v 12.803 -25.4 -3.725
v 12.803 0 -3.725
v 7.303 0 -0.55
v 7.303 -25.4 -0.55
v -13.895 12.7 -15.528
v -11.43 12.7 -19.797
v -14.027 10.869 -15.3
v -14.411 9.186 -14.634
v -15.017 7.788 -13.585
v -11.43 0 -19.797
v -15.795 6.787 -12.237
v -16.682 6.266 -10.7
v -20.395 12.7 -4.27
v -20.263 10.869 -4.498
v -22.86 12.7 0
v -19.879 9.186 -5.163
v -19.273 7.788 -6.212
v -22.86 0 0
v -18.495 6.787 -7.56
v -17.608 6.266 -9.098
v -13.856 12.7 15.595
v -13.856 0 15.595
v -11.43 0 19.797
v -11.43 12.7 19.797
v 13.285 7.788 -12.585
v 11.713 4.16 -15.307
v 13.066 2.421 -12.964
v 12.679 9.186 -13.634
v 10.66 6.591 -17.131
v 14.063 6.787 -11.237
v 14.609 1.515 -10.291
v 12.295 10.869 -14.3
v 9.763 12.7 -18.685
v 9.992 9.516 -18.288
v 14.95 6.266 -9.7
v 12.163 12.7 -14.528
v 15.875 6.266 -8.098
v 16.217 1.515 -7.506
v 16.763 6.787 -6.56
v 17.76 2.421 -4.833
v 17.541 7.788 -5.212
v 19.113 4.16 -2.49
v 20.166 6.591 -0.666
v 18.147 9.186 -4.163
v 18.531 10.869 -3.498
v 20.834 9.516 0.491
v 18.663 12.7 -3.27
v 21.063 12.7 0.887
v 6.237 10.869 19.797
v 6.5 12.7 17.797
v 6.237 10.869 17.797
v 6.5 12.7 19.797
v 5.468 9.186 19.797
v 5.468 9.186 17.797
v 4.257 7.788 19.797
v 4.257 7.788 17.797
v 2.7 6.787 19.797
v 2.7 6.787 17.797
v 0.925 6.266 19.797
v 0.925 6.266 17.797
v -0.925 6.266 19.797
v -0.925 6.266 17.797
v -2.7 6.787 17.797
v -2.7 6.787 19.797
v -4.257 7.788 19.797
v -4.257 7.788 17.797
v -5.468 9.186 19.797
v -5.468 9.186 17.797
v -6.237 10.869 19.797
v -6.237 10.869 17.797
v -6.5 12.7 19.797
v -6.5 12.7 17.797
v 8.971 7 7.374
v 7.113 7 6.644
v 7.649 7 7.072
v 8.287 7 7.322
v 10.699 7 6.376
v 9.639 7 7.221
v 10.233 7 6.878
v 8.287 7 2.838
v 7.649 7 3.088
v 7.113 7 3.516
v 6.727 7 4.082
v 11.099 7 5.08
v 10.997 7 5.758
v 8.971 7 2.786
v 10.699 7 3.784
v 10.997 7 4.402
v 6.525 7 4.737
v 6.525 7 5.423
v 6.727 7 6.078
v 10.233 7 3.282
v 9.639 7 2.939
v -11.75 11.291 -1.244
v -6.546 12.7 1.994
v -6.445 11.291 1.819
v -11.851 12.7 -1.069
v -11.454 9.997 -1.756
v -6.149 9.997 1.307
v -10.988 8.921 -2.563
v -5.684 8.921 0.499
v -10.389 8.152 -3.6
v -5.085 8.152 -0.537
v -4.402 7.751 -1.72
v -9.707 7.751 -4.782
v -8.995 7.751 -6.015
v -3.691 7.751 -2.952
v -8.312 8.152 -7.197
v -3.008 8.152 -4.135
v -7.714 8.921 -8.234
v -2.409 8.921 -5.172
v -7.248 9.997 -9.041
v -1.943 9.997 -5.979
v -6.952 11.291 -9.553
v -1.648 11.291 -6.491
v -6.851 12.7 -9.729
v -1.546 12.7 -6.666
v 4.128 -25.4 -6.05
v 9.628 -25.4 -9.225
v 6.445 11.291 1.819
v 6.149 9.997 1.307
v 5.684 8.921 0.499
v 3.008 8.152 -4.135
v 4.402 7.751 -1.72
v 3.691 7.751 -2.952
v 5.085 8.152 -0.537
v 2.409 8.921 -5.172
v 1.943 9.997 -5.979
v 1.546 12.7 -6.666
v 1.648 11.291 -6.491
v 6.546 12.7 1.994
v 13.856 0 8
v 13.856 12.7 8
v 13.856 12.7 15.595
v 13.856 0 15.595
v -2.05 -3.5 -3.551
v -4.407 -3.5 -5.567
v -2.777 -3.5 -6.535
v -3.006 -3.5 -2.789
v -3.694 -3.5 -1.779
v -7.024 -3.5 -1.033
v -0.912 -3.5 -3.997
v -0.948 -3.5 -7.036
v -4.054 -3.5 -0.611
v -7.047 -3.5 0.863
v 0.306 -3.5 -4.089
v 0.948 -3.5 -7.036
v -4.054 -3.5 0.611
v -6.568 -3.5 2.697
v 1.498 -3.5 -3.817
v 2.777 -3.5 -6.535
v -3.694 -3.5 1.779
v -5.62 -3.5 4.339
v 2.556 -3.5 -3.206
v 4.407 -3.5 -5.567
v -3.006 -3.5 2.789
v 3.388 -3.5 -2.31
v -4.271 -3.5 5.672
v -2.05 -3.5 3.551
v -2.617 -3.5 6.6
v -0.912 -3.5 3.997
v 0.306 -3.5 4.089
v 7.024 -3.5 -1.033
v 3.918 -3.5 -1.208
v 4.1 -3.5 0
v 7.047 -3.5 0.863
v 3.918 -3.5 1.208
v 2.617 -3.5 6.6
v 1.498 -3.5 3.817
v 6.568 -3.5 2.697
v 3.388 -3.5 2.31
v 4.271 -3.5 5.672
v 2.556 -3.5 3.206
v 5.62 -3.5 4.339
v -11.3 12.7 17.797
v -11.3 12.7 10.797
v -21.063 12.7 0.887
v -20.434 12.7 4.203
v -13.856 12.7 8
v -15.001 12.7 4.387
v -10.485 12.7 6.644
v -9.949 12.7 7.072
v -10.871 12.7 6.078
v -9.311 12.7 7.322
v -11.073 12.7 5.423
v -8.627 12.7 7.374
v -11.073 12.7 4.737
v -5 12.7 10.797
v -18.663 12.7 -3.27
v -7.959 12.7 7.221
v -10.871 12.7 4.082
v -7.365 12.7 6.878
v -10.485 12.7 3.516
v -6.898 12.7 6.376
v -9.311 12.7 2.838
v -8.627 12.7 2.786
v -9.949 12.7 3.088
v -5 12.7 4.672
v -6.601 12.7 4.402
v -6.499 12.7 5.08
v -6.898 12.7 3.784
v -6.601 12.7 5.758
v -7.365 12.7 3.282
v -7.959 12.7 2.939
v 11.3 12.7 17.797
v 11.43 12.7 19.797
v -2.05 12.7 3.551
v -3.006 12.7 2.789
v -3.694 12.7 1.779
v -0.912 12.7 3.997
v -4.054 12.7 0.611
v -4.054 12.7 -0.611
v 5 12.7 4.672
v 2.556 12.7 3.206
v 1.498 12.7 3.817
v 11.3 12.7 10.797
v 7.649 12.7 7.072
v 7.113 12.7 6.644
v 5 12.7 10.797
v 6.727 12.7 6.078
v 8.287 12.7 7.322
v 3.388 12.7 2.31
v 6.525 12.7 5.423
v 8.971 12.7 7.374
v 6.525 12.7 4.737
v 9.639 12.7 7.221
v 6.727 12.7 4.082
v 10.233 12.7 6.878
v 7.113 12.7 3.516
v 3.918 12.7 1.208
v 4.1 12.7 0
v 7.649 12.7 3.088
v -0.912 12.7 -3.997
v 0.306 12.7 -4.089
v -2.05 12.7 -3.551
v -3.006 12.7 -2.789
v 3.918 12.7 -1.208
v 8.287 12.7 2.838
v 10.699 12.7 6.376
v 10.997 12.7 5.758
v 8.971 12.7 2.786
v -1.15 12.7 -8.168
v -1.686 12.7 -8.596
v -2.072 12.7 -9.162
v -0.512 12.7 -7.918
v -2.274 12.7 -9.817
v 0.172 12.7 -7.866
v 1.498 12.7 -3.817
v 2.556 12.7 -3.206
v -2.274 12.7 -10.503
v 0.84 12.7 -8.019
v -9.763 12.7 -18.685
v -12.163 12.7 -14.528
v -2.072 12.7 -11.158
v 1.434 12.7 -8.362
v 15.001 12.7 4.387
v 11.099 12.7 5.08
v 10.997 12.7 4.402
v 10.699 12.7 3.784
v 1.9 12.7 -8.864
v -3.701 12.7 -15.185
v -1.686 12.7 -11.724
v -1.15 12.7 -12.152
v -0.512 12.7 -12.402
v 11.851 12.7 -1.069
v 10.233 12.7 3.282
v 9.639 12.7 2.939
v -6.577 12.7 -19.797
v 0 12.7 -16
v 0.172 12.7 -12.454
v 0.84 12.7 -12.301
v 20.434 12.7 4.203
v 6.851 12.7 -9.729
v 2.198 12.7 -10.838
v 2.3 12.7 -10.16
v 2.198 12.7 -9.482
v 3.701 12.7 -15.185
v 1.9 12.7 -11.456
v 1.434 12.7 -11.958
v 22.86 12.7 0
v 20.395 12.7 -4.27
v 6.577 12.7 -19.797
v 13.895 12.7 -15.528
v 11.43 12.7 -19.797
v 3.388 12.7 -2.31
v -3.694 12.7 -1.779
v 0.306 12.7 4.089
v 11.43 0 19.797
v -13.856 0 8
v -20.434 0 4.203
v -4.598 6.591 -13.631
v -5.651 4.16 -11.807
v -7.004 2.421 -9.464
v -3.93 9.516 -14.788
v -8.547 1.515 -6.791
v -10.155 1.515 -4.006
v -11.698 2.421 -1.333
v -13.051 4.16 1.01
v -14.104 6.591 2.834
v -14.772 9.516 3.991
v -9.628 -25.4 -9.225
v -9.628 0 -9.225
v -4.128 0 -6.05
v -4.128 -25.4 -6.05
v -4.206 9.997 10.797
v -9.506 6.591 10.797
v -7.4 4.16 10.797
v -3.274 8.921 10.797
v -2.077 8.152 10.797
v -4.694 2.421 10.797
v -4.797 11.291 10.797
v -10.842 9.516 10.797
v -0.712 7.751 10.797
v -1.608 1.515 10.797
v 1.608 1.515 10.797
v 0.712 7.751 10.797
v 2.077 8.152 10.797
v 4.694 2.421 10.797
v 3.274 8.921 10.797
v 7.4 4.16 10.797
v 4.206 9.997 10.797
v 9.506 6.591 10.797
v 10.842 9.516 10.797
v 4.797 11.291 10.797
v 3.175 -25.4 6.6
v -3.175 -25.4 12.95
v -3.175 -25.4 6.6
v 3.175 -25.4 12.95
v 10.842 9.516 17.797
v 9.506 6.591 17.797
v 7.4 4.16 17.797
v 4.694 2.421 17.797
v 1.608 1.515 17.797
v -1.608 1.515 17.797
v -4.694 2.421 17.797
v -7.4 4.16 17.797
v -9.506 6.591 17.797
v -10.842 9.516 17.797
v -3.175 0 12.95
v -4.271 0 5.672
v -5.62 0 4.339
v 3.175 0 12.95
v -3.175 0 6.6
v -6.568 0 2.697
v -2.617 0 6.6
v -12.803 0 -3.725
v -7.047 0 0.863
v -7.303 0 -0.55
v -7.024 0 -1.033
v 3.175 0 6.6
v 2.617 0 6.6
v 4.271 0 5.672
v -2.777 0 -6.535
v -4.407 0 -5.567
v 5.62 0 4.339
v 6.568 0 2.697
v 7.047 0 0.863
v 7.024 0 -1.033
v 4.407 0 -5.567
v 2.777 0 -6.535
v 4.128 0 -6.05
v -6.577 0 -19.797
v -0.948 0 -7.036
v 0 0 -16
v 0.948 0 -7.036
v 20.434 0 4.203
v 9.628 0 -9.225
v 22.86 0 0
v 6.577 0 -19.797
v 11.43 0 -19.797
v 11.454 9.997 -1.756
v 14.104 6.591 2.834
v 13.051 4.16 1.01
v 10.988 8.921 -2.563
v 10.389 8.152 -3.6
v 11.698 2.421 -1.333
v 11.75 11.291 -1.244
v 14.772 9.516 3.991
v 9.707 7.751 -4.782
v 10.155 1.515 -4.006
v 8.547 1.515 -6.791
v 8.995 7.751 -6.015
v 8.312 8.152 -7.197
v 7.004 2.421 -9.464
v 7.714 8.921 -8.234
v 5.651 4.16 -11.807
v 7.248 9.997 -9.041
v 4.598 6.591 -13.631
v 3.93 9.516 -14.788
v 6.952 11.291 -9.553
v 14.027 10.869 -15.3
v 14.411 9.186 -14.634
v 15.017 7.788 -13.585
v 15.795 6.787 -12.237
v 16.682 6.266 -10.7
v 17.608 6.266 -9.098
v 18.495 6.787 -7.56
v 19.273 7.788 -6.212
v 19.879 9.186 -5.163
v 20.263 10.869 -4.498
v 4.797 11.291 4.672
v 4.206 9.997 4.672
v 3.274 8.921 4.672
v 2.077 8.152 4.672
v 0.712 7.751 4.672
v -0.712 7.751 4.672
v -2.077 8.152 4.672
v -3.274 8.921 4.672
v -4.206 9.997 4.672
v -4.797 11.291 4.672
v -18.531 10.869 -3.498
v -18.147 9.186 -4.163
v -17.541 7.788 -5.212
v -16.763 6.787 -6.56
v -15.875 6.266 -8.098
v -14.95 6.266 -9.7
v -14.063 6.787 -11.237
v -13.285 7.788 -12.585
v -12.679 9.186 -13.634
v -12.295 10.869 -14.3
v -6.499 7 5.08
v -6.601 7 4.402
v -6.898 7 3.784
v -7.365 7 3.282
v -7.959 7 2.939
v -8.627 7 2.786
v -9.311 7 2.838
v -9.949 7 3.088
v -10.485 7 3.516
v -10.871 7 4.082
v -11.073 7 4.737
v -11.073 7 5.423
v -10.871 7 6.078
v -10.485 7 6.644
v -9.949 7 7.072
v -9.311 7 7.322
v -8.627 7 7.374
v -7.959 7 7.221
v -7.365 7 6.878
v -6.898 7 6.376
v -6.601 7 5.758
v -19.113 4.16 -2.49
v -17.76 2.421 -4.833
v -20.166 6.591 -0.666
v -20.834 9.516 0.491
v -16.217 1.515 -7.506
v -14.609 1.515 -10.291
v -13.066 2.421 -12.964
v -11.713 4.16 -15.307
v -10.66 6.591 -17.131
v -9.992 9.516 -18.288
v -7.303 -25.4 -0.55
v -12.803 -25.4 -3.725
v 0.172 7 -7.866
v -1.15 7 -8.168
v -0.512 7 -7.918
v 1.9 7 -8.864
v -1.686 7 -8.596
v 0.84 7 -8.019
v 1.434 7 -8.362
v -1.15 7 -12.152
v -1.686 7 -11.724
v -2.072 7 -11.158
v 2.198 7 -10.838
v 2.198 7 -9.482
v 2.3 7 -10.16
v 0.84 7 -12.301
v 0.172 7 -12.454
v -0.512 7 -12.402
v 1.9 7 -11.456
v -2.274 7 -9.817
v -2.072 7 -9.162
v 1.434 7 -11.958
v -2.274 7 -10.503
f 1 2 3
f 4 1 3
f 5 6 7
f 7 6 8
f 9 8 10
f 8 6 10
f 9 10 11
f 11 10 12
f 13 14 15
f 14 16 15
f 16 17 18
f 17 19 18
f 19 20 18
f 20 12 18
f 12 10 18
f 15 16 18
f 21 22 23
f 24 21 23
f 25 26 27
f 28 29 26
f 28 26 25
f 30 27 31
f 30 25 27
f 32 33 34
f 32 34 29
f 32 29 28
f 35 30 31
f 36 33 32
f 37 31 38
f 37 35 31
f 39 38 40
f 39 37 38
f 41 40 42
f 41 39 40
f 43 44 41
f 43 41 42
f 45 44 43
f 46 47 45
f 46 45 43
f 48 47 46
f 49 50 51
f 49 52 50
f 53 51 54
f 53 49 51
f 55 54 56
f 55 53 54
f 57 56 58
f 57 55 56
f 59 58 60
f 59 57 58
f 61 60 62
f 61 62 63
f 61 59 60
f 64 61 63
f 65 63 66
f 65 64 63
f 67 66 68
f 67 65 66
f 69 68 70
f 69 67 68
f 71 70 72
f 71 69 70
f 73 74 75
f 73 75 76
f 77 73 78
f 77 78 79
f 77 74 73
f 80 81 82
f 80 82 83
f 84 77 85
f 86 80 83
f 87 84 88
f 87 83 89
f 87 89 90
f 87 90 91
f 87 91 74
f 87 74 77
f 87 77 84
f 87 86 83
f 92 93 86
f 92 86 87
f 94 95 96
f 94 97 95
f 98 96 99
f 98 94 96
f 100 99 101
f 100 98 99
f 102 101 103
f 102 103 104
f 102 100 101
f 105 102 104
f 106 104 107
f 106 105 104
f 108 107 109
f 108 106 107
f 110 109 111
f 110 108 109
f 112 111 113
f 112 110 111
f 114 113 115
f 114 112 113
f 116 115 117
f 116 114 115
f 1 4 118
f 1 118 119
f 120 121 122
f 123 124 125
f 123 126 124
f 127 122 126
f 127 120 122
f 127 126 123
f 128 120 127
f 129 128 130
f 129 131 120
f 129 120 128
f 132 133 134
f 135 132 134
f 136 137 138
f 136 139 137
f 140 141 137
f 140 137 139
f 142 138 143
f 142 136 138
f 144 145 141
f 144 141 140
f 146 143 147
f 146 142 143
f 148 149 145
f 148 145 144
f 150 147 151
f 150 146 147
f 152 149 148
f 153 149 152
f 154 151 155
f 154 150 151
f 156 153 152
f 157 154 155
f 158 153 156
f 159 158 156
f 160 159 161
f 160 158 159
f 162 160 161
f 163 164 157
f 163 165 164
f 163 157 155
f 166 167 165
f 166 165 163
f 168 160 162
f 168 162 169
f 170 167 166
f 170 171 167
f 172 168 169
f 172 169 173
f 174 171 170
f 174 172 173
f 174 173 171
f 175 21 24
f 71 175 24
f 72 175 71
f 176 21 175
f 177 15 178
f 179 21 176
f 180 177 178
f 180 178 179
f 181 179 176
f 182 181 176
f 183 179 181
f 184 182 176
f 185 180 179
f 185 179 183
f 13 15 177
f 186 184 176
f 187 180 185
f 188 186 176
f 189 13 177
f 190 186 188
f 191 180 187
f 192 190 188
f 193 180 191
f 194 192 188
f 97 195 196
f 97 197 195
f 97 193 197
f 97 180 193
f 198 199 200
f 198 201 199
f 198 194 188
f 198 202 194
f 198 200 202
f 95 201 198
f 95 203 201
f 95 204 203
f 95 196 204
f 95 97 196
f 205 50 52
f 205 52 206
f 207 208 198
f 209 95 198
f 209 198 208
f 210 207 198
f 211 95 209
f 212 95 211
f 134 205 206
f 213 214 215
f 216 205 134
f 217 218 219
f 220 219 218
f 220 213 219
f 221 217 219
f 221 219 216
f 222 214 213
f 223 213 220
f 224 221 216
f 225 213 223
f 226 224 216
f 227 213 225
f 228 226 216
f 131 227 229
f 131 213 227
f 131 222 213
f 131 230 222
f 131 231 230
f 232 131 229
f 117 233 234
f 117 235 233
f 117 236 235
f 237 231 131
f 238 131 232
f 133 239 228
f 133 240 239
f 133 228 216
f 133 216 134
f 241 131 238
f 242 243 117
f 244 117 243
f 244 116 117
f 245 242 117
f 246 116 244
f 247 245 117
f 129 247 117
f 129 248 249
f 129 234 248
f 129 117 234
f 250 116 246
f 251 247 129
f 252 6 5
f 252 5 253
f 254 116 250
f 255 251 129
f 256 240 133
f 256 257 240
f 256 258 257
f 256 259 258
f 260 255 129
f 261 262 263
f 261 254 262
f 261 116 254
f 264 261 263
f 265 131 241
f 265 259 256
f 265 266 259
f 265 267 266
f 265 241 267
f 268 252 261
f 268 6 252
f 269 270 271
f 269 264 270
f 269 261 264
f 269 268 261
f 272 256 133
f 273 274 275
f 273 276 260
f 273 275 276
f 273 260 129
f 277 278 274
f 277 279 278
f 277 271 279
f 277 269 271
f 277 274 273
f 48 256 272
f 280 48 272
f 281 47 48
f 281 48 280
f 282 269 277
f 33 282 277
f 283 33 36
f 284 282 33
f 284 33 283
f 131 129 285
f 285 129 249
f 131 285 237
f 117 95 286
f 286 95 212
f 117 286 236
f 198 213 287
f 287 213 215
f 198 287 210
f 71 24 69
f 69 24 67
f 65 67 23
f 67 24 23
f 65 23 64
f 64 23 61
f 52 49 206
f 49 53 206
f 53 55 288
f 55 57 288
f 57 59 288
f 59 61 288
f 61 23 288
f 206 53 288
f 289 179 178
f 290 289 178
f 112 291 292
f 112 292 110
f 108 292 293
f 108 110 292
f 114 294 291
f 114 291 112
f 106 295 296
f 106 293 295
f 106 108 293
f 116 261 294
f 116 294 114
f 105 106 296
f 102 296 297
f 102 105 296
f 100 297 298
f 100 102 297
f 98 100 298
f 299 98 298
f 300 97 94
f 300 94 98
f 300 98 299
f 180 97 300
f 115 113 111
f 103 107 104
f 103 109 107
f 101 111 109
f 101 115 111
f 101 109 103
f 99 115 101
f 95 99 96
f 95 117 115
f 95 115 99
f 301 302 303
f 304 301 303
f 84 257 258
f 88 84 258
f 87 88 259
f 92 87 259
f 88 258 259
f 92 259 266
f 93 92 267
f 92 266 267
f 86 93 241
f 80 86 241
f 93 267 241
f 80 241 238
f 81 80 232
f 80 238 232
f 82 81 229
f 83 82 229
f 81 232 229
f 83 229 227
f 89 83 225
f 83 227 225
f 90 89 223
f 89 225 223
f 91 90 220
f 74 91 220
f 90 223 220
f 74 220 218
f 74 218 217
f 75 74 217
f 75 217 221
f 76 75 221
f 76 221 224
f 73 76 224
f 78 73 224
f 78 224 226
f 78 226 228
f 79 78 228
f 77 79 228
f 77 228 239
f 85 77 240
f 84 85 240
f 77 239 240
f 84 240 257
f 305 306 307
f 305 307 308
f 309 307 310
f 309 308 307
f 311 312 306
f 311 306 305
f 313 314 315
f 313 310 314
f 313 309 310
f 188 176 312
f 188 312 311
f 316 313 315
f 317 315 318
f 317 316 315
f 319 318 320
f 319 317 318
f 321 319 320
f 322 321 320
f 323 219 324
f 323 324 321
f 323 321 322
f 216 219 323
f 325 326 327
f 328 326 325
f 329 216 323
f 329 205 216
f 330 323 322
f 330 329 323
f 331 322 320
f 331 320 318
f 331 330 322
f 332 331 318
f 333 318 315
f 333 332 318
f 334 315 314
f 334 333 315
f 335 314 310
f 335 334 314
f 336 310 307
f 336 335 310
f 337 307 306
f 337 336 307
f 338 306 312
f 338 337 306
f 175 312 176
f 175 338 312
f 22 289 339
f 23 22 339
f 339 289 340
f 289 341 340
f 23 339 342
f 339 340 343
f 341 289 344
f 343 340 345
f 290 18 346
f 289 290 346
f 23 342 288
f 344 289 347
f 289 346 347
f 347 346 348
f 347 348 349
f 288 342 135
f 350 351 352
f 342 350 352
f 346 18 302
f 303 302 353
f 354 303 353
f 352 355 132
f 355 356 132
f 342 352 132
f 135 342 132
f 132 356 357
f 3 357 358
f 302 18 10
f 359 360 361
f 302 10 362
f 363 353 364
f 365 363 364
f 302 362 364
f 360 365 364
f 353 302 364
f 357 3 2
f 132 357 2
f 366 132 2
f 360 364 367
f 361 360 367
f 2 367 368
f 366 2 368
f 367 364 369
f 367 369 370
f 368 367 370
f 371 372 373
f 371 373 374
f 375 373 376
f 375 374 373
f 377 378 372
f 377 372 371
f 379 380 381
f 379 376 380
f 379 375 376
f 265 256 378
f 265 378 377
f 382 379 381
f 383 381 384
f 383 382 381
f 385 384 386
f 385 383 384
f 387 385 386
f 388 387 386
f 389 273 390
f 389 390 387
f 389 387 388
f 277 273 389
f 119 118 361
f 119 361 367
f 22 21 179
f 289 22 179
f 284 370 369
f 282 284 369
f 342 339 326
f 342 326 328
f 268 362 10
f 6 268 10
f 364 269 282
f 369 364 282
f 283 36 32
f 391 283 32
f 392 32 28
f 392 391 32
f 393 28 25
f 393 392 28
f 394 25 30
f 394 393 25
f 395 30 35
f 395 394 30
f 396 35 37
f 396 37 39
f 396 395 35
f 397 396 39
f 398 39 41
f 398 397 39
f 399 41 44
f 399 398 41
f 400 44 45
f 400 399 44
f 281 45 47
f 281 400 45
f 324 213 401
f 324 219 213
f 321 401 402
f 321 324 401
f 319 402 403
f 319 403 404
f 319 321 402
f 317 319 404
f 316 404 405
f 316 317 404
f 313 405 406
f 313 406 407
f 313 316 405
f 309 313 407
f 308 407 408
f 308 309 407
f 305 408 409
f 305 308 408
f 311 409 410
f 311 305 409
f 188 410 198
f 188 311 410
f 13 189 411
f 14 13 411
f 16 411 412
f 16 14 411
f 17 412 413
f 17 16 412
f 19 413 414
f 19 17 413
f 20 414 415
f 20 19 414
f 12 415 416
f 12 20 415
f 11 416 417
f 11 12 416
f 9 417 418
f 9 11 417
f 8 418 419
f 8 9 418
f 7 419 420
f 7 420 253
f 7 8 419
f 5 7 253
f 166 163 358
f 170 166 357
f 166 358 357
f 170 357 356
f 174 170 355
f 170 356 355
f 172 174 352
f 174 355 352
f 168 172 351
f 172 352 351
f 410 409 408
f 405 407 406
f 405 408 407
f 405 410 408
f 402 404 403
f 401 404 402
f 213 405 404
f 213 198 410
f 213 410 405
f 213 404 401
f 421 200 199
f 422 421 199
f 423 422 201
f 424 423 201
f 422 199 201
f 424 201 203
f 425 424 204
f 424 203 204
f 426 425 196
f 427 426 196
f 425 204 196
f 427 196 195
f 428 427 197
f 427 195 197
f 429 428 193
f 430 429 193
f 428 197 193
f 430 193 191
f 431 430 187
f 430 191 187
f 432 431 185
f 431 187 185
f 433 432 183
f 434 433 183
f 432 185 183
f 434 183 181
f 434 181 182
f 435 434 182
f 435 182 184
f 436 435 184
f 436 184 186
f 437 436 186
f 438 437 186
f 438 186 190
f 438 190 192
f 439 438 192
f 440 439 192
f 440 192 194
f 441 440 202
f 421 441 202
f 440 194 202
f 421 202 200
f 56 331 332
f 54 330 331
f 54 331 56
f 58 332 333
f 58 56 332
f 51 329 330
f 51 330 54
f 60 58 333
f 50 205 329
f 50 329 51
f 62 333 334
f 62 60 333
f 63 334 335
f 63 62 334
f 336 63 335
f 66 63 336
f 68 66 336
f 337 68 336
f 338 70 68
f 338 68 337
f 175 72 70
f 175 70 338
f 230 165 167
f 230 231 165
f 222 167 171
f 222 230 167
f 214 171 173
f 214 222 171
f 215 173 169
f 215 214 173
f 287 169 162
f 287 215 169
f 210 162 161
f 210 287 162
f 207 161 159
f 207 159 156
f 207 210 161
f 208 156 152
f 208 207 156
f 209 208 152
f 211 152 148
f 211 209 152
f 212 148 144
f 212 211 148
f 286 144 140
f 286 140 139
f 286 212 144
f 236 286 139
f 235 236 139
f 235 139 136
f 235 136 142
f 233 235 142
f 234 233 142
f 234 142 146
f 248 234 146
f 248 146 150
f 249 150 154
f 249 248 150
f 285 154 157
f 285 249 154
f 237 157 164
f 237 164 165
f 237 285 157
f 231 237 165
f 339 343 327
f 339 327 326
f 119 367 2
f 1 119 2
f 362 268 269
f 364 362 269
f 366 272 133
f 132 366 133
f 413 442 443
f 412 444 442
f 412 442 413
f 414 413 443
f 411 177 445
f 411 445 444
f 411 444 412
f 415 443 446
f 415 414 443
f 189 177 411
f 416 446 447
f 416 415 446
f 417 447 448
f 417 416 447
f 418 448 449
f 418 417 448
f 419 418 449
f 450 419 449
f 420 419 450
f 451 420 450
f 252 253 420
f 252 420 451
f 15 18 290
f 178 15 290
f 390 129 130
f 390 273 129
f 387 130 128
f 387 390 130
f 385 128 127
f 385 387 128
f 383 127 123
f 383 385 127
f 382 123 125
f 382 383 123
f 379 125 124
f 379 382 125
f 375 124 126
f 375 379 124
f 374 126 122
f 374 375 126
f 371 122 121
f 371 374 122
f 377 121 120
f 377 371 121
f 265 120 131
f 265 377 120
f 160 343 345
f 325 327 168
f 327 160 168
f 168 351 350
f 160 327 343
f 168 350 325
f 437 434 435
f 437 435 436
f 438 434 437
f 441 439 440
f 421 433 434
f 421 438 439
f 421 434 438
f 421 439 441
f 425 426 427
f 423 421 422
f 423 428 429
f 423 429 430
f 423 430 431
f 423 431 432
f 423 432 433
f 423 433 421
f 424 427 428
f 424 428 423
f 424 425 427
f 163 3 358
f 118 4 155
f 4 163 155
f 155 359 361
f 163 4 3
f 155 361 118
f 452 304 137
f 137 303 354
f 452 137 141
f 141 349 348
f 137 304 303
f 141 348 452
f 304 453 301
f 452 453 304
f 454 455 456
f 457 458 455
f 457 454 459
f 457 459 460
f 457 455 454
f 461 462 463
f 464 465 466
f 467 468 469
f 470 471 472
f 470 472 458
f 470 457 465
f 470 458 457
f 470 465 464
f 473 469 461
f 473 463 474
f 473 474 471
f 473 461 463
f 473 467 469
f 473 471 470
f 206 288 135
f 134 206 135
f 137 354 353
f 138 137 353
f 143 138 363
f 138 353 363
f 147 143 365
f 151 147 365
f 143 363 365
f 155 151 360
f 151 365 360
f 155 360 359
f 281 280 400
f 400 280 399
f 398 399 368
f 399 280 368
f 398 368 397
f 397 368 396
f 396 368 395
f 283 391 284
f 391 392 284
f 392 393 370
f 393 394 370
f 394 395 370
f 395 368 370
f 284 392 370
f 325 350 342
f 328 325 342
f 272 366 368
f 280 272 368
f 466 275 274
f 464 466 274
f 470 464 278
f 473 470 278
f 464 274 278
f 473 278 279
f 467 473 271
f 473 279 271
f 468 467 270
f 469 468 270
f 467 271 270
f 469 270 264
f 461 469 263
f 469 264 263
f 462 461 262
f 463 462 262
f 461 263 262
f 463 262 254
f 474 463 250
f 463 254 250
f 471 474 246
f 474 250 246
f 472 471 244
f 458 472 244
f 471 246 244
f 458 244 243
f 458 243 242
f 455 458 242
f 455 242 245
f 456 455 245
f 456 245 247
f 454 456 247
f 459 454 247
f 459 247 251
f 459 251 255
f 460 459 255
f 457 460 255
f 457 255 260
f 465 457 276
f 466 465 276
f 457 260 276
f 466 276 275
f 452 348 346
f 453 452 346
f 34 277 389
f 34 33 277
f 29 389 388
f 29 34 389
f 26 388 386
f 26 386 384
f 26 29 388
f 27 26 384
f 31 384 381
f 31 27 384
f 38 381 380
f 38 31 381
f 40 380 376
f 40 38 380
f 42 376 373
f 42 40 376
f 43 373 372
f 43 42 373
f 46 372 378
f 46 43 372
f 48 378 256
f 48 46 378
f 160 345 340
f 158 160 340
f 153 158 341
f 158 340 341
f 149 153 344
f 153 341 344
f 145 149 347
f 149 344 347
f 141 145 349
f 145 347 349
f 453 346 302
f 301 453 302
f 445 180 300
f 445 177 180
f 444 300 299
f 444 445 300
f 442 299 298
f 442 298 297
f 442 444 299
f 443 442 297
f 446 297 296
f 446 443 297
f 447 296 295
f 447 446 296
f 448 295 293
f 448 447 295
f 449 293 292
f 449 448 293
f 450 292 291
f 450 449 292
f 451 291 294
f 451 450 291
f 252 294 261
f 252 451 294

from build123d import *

# Parameters (mm, degrees)
BOSS_EXTRUDE1_DEPTH = 12.7
SKETCH2_R           = 7.100000009
SKETCH2_R_2         = 4.100000009
BOSS_EXTRUDE2_DEPTH = 3.499999906
SKETCH4_W           = 6.35
SKETCH4_H           = 6.35
BOSS_EXTRUDE4_DEPTH = 25.4
CIRPATTERN1_COUNT   = 3
SKETCH6_R           = 4.100000009
CUT_EXTRUDE1_DEPTH  = 39.1
SKETCH7_R           = 2.3
CUT_EXTRUDE2_DEPTH  = 5.7
CUT_EXTRUDE4_DEPTH  = 39.1


with BuildPart() as part:
    # Sketch1 → Boss-Extrude1 (new body)
    with BuildSketch(Plane(origin=(0, 0, 0), x_dir=(1, 0, 0), z_dir=(0, 1, 0))):
        Polygon((11.43, -19.797340731), (22.86, 0), (11.43, 19.797340731), (-11.43, 19.797340731), (-22.86, 0), (-11.43, -19.797340731), align=None)
    extrude(amount=BOSS_EXTRUDE1_DEPTH)

    # Sketch2 → Boss-Extrude2 (add)
    with BuildSketch(Plane.XZ):
        Circle(SKETCH2_R)
        Circle(SKETCH2_R_2, mode=Mode.SUBTRACT)
    extrude(amount=BOSS_EXTRUDE2_DEPTH)

    # Sketch4 → Boss-Extrude4 (add)
    with BuildSketch(Plane.XZ):
        Polygon((12.802528987, -3.725369347), (7.303267673, -0.550369347), (4.128267673, -6.049630662), (9.627528987, -9.224630662), align=None)
        with Locations((0, 9.775000009)):
            Rectangle(SKETCH4_W, SKETCH4_H)
        Polygon((-9.627528987, -9.224630662), (-4.128267673, -6.049630662), (-7.303267673, -0.550369347), (-12.802528987, -3.725369347), align=None)
    extrude(amount=BOSS_EXTRUDE4_DEPTH)

    # Sketch5 → Cut-Revolve1 (revolve, cut)
    with BuildSketch(Plane(origin=(0, 12.7, 0), x_dir=(1, 0, 0), z_dir=(0, 1, 0))):
        Polygon((0, -19.797340731), (0, -4.672340739), (-5, -4.672340739), (-5, -10.797340731), (-11.300000152, -10.797340731), (-11.300000152, -17.797340731), (-6.5, -17.797340731), (-6.5, -19.797340731), align=None)
    cut_revolve1 = revolve(axis=Axis((0, 12.7, 19.797340731), (0, 0, -1)), mode=Mode.SUBTRACT)

    # CirPattern1: Cut-Revolve1 ×3 about axis
    cirpattern1_axis = Axis((0, 0, 0), (0, 1, 0))
    for i in range(1, CIRPATTERN1_COUNT):
        add(cut_revolve1.rotate(cirpattern1_axis, i * 360 / CIRPATTERN1_COUNT), mode=Mode.SUBTRACT)

    # Sketch6 → Cut-Extrude1 (cut, through all)
    with BuildSketch(Plane(origin=(0, 12.7, 0), x_dir=(1, 0, 0), z_dir=(0, 1, 0))):
        Circle(SKETCH6_R)
    extrude(amount=-CUT_EXTRUDE1_DEPTH, mode=Mode.SUBTRACT)

    # Sketch7 → Cut-Extrude2 (cut)
    with BuildSketch(Plane(origin=(0, 12.7, 0), x_dir=(1, 0, 0), z_dir=(0, 1, 0))):
        with Locations((0, 10.16)):
            Circle(SKETCH7_R)
        with Locations((8.798818102, -5.08)):
            Circle(SKETCH7_R)
        with Locations((-8.798818102, -5.08)):
            Circle(SKETCH7_R)
    extrude(amount=-CUT_EXTRUDE2_DEPTH, mode=Mode.SUBTRACT)

    # Sketch9 → Cut-Extrude4 (cut, through all)
    with BuildSketch(Plane(origin=(0, 12.7, 0), x_dir=(1, 0, 0), z_dir=(0, 1, 0))):
        Polygon((-6.577186816, 19.797340731), (0, 16.000000152), (6.577186816, 19.797340731), align=None)
        Polygon((20.433593408, -4.202659497), (13.856406592, -8.000000076), (13.856406592, -15.594681234), align=None)
        Polygon((-13.856406592, -15.594681234), (-13.856406592, -8.000000076), (-20.433593408, -4.202659497), align=None)
    extrude(amount=-CUT_EXTRUDE4_DEPTH, mode=Mode.SUBTRACT)


solid = part.part
